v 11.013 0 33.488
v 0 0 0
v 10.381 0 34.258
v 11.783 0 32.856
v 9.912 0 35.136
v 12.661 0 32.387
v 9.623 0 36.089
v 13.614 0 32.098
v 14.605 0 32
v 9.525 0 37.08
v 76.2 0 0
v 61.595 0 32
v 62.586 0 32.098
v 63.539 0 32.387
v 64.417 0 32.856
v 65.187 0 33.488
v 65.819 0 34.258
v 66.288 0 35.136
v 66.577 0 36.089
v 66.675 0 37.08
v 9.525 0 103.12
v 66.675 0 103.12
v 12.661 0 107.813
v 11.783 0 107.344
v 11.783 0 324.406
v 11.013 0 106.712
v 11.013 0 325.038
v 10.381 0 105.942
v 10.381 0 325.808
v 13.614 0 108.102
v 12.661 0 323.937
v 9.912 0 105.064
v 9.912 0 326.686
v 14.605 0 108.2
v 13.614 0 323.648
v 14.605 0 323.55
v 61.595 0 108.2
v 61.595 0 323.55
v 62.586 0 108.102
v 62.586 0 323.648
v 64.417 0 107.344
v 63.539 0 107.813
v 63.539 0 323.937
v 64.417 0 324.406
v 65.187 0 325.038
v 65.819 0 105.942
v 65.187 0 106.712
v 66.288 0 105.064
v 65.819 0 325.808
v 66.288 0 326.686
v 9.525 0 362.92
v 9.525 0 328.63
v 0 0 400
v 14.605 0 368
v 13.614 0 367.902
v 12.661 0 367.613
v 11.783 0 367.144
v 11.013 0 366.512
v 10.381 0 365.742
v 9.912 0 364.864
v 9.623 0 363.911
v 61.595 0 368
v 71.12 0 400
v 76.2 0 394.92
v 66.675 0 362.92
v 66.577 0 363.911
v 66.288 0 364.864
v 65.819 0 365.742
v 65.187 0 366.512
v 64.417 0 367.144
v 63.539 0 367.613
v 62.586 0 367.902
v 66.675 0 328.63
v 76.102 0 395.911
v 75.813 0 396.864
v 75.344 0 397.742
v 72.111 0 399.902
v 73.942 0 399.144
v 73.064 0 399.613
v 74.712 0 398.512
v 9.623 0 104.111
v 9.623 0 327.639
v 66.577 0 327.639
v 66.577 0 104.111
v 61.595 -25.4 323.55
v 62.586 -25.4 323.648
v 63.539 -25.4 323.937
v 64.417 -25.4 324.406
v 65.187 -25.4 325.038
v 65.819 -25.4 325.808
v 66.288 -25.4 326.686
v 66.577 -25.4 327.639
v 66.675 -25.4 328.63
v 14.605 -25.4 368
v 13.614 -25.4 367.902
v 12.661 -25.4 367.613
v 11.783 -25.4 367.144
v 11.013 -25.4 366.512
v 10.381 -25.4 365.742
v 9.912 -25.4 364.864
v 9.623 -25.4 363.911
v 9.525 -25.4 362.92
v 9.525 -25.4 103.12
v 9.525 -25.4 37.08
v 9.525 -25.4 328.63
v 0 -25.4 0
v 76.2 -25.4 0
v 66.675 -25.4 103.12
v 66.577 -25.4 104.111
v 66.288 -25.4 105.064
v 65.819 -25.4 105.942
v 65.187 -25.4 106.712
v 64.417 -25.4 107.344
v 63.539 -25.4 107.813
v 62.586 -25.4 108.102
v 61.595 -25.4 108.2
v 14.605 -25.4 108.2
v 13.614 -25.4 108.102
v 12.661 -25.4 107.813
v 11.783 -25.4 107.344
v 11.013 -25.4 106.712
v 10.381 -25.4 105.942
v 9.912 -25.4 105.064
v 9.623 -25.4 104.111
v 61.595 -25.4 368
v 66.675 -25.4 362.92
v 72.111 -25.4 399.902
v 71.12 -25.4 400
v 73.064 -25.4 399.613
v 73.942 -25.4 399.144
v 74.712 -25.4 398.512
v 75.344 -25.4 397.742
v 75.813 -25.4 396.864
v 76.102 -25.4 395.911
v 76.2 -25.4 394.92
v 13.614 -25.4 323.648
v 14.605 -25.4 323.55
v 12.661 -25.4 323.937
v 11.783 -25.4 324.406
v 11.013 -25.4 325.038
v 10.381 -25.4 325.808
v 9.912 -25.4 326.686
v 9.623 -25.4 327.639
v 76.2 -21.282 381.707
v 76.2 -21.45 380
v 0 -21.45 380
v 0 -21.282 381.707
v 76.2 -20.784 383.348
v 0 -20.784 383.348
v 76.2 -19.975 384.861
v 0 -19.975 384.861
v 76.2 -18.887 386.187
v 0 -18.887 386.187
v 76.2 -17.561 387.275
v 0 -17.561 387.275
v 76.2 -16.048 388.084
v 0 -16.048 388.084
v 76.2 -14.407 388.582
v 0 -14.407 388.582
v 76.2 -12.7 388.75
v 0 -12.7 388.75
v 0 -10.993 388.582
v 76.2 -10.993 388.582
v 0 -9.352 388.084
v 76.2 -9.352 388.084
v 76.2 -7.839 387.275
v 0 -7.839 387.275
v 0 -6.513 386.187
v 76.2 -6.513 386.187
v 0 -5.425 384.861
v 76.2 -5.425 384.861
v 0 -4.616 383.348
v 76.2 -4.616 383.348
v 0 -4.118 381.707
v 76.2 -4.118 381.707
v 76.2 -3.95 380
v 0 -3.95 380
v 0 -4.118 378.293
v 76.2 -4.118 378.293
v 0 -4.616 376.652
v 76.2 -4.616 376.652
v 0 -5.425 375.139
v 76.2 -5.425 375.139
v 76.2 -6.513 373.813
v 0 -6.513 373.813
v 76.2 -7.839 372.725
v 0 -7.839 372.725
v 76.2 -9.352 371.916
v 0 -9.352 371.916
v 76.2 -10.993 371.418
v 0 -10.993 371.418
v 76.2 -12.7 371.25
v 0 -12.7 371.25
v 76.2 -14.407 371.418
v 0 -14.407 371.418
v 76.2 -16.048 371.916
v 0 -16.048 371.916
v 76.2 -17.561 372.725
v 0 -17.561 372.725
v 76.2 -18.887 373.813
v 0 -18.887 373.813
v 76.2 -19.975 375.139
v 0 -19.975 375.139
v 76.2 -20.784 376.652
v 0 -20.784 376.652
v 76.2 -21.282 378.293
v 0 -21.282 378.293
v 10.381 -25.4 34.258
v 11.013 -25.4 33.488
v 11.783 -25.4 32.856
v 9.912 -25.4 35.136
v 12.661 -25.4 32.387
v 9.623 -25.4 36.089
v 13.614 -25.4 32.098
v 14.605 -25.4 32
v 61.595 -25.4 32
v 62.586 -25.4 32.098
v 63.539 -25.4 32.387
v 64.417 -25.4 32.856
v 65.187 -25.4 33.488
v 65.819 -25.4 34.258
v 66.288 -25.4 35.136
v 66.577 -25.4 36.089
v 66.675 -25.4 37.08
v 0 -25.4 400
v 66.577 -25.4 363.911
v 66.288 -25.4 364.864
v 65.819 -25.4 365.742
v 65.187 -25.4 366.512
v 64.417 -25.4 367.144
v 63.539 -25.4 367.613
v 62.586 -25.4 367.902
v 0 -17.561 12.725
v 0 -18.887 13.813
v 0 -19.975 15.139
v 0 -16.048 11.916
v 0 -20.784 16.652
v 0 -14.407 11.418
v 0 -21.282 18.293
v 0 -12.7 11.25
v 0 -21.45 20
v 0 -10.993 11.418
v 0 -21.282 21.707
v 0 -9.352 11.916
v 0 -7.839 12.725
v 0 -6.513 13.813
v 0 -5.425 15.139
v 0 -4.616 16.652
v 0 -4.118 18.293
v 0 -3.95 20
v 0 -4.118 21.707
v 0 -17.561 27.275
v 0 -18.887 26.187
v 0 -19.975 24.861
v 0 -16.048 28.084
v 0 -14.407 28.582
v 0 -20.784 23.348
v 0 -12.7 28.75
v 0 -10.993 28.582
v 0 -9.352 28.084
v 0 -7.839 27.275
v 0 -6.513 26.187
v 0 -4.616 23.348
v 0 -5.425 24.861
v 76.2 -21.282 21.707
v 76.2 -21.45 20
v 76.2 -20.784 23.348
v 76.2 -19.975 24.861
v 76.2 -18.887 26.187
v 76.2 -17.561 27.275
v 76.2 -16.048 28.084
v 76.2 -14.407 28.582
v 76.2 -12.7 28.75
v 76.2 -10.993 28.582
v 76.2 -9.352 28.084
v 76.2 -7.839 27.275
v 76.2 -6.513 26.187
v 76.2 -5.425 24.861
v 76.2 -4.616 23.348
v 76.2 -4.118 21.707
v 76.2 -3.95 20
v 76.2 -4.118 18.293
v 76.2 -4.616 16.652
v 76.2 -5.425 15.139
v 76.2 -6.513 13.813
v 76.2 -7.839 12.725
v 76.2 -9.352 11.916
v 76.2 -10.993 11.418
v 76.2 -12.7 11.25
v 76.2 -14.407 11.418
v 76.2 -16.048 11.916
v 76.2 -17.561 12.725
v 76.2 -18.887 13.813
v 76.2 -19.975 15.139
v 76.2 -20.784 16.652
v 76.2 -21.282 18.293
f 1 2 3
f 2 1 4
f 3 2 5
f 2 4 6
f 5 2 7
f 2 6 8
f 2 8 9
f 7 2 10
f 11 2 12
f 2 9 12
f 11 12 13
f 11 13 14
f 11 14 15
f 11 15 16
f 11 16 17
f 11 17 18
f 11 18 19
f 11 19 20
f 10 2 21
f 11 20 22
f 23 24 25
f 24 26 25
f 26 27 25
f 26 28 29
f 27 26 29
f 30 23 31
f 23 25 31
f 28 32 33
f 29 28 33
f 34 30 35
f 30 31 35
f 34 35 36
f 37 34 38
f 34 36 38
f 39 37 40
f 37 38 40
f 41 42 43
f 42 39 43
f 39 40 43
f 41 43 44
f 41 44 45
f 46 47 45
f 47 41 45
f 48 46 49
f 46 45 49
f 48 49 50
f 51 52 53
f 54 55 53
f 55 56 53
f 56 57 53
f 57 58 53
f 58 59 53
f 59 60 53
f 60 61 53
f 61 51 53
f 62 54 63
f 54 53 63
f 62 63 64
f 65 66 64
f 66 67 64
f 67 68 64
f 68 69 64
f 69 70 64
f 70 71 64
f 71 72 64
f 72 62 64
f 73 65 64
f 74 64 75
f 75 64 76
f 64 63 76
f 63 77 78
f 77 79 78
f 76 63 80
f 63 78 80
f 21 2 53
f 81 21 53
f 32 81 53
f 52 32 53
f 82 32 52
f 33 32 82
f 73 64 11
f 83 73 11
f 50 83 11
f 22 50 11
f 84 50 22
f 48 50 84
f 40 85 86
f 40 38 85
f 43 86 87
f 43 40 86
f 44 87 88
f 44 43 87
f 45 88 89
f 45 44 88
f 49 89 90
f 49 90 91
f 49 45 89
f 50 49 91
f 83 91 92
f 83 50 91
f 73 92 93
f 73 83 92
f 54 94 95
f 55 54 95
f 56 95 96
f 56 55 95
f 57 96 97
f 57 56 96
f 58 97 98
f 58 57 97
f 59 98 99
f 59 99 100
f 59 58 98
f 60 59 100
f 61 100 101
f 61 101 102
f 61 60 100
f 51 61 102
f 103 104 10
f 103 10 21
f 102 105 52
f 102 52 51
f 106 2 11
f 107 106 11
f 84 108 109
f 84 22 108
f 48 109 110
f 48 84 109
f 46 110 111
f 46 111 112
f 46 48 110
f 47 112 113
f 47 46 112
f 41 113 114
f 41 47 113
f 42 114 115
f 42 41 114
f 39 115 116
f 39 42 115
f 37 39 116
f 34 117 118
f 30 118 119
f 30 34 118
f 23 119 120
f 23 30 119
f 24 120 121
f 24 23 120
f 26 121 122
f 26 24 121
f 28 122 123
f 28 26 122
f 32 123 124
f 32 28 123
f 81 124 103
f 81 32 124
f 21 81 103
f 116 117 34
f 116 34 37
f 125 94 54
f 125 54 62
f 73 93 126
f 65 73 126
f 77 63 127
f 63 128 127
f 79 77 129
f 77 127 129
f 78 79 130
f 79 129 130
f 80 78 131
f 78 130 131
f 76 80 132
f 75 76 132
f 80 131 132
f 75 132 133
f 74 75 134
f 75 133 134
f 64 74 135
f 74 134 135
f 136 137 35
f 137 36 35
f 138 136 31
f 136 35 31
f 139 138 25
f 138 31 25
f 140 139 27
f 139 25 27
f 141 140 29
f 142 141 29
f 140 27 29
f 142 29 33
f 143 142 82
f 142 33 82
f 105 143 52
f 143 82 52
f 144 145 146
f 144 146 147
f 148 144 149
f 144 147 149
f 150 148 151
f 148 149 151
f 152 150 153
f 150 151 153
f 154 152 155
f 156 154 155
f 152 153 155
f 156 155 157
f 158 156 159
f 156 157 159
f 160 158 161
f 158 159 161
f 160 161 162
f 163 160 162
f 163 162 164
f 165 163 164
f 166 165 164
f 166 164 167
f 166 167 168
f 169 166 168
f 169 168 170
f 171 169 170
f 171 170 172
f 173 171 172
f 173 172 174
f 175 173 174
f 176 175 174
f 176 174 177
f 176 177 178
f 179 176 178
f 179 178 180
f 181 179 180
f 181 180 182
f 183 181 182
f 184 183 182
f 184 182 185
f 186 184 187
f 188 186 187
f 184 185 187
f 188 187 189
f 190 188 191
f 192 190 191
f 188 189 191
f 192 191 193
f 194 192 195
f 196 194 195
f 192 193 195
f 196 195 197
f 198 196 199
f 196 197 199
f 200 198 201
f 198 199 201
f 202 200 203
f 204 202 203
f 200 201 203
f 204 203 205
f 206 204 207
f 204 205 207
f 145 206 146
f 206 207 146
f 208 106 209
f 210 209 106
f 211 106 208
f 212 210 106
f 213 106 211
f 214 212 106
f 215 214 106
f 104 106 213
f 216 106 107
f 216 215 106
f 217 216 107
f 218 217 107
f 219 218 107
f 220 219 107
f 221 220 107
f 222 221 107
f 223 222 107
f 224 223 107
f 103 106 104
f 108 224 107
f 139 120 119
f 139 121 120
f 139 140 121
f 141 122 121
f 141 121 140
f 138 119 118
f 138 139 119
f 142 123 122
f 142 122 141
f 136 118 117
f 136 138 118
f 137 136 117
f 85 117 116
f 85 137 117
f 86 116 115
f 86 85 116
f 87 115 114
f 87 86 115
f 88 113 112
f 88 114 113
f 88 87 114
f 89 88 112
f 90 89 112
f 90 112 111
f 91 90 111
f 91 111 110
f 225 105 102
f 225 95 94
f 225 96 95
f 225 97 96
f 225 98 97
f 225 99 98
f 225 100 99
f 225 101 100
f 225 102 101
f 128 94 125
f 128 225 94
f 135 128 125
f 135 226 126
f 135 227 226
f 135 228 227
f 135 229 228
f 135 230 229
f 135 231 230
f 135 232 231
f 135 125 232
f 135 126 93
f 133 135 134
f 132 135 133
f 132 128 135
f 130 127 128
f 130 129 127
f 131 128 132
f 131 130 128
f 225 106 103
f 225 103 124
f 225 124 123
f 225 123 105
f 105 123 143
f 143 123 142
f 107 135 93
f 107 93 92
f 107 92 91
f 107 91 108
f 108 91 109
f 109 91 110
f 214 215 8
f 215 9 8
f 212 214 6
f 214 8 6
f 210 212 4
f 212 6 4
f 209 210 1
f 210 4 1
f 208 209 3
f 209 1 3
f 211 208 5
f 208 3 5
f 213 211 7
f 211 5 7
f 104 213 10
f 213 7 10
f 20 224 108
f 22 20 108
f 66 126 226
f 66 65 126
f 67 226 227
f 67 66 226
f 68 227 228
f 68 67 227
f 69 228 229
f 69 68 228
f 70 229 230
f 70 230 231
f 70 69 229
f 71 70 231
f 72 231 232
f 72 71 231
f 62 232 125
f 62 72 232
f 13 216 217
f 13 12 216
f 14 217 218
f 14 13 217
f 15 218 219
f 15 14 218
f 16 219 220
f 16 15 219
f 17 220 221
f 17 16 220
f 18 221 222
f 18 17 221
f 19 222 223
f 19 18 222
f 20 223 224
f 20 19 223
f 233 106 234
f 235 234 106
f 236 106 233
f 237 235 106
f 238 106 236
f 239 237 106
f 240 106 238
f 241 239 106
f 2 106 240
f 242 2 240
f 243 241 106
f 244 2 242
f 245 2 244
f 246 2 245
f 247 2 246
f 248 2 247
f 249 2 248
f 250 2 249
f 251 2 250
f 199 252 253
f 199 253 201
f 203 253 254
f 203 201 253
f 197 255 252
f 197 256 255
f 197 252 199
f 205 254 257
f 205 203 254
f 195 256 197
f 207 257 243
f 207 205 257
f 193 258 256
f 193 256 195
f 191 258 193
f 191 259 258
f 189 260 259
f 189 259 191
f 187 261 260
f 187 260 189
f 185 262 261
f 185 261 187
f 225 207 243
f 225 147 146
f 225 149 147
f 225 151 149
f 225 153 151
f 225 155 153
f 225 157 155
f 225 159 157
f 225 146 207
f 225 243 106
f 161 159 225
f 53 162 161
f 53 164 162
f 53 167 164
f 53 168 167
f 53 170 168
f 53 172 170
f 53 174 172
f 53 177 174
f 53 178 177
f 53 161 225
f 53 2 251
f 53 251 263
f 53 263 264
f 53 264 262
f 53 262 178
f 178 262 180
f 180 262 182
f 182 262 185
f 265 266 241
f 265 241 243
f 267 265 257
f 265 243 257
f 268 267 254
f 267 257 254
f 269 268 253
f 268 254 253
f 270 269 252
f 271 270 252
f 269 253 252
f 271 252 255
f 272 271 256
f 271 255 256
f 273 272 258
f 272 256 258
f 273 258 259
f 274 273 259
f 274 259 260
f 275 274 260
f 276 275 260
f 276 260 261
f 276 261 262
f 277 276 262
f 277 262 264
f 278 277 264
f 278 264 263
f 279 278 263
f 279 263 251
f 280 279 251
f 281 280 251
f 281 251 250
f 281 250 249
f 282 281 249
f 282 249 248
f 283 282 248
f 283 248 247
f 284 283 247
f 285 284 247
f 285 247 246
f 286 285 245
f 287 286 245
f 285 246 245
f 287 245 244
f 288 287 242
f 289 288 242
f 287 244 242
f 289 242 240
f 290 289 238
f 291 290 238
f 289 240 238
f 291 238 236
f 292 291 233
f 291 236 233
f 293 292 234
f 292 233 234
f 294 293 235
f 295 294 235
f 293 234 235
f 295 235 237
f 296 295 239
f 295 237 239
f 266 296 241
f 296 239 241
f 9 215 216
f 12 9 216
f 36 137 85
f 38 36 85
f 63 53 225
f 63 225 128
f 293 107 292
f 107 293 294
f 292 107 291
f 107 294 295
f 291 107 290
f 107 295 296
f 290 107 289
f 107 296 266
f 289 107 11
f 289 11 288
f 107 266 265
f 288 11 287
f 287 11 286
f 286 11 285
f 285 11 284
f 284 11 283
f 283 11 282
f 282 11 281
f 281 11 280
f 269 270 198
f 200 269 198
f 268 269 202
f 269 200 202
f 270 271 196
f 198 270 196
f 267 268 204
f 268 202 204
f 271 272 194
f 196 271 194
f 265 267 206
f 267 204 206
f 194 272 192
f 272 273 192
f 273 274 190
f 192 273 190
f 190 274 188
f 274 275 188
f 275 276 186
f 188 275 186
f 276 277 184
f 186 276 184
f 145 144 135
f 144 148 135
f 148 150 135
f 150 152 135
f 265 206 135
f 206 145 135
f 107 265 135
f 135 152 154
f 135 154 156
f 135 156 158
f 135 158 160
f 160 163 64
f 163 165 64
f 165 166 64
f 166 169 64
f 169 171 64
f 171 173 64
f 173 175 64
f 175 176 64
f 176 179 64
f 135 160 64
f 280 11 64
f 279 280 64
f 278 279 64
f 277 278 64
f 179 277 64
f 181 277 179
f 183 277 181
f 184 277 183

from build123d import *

# Parameters (mm, degrees)
F0_W     = 76.2
F0_H     = 400
F1_DEPTH = 25.4
F3_D     = 17.5
F4_W     = 57.15
F4_H     = 76.2
F4_H_2   = 44.45
F5_DEPTH = 25.401
F6_R     = 5.08
F7_R     = 5.08


with BuildPart() as f1:
    # F0 (on Front) → F1 (new body)
    with BuildSketch(Plane.XZ):
        with Locations((38.1, 200)):
            Rectangle(F0_W, F0_H)
    extrude(amount=F1_DEPTH)

    # F3 (through all)
    with Locations(Plane.YZ.offset(76.2)):
        with Locations((-12.7, 380), (-12.7, 20)):
            Hole(F3_D / 2)

    # F4 (on face) → F5 (cut, through all)
    with BuildSketch(Plane.XZ.offset(25.4)):
        with Locations((38.1, 70.1)):
            Rectangle(F4_W, F4_H)
        with Locations((38.1, 345.775)):
            Rectangle(F4_W, F4_H_2)
    extrude(amount=-F5_DEPTH, mode=Mode.SUBTRACT)

    # F6
    f6_edges = [f1.edges().sort_by_distance(p)[0] for p in [
        (9.525, -12.7, 108.2),
        (66.675, -12.7, 108.2),
        (66.675, -12.7, 32),
        (9.525, -12.7, 32),
        (9.525, -12.7, 323.55),
        (66.675, -12.7, 323.55),
        (9.525, -12.7, 368),
        (66.675, -12.7, 368),
    ]]
    fillet(f6_edges, radius=F6_R)

    # F7
    f7_edges = [f1.edges().sort_by_distance(p)[0] for p in [
        (76.2, -12.7, 400),
    ]]
    fillet(f7_edges, radius=F7_R)


solid = f1.part
